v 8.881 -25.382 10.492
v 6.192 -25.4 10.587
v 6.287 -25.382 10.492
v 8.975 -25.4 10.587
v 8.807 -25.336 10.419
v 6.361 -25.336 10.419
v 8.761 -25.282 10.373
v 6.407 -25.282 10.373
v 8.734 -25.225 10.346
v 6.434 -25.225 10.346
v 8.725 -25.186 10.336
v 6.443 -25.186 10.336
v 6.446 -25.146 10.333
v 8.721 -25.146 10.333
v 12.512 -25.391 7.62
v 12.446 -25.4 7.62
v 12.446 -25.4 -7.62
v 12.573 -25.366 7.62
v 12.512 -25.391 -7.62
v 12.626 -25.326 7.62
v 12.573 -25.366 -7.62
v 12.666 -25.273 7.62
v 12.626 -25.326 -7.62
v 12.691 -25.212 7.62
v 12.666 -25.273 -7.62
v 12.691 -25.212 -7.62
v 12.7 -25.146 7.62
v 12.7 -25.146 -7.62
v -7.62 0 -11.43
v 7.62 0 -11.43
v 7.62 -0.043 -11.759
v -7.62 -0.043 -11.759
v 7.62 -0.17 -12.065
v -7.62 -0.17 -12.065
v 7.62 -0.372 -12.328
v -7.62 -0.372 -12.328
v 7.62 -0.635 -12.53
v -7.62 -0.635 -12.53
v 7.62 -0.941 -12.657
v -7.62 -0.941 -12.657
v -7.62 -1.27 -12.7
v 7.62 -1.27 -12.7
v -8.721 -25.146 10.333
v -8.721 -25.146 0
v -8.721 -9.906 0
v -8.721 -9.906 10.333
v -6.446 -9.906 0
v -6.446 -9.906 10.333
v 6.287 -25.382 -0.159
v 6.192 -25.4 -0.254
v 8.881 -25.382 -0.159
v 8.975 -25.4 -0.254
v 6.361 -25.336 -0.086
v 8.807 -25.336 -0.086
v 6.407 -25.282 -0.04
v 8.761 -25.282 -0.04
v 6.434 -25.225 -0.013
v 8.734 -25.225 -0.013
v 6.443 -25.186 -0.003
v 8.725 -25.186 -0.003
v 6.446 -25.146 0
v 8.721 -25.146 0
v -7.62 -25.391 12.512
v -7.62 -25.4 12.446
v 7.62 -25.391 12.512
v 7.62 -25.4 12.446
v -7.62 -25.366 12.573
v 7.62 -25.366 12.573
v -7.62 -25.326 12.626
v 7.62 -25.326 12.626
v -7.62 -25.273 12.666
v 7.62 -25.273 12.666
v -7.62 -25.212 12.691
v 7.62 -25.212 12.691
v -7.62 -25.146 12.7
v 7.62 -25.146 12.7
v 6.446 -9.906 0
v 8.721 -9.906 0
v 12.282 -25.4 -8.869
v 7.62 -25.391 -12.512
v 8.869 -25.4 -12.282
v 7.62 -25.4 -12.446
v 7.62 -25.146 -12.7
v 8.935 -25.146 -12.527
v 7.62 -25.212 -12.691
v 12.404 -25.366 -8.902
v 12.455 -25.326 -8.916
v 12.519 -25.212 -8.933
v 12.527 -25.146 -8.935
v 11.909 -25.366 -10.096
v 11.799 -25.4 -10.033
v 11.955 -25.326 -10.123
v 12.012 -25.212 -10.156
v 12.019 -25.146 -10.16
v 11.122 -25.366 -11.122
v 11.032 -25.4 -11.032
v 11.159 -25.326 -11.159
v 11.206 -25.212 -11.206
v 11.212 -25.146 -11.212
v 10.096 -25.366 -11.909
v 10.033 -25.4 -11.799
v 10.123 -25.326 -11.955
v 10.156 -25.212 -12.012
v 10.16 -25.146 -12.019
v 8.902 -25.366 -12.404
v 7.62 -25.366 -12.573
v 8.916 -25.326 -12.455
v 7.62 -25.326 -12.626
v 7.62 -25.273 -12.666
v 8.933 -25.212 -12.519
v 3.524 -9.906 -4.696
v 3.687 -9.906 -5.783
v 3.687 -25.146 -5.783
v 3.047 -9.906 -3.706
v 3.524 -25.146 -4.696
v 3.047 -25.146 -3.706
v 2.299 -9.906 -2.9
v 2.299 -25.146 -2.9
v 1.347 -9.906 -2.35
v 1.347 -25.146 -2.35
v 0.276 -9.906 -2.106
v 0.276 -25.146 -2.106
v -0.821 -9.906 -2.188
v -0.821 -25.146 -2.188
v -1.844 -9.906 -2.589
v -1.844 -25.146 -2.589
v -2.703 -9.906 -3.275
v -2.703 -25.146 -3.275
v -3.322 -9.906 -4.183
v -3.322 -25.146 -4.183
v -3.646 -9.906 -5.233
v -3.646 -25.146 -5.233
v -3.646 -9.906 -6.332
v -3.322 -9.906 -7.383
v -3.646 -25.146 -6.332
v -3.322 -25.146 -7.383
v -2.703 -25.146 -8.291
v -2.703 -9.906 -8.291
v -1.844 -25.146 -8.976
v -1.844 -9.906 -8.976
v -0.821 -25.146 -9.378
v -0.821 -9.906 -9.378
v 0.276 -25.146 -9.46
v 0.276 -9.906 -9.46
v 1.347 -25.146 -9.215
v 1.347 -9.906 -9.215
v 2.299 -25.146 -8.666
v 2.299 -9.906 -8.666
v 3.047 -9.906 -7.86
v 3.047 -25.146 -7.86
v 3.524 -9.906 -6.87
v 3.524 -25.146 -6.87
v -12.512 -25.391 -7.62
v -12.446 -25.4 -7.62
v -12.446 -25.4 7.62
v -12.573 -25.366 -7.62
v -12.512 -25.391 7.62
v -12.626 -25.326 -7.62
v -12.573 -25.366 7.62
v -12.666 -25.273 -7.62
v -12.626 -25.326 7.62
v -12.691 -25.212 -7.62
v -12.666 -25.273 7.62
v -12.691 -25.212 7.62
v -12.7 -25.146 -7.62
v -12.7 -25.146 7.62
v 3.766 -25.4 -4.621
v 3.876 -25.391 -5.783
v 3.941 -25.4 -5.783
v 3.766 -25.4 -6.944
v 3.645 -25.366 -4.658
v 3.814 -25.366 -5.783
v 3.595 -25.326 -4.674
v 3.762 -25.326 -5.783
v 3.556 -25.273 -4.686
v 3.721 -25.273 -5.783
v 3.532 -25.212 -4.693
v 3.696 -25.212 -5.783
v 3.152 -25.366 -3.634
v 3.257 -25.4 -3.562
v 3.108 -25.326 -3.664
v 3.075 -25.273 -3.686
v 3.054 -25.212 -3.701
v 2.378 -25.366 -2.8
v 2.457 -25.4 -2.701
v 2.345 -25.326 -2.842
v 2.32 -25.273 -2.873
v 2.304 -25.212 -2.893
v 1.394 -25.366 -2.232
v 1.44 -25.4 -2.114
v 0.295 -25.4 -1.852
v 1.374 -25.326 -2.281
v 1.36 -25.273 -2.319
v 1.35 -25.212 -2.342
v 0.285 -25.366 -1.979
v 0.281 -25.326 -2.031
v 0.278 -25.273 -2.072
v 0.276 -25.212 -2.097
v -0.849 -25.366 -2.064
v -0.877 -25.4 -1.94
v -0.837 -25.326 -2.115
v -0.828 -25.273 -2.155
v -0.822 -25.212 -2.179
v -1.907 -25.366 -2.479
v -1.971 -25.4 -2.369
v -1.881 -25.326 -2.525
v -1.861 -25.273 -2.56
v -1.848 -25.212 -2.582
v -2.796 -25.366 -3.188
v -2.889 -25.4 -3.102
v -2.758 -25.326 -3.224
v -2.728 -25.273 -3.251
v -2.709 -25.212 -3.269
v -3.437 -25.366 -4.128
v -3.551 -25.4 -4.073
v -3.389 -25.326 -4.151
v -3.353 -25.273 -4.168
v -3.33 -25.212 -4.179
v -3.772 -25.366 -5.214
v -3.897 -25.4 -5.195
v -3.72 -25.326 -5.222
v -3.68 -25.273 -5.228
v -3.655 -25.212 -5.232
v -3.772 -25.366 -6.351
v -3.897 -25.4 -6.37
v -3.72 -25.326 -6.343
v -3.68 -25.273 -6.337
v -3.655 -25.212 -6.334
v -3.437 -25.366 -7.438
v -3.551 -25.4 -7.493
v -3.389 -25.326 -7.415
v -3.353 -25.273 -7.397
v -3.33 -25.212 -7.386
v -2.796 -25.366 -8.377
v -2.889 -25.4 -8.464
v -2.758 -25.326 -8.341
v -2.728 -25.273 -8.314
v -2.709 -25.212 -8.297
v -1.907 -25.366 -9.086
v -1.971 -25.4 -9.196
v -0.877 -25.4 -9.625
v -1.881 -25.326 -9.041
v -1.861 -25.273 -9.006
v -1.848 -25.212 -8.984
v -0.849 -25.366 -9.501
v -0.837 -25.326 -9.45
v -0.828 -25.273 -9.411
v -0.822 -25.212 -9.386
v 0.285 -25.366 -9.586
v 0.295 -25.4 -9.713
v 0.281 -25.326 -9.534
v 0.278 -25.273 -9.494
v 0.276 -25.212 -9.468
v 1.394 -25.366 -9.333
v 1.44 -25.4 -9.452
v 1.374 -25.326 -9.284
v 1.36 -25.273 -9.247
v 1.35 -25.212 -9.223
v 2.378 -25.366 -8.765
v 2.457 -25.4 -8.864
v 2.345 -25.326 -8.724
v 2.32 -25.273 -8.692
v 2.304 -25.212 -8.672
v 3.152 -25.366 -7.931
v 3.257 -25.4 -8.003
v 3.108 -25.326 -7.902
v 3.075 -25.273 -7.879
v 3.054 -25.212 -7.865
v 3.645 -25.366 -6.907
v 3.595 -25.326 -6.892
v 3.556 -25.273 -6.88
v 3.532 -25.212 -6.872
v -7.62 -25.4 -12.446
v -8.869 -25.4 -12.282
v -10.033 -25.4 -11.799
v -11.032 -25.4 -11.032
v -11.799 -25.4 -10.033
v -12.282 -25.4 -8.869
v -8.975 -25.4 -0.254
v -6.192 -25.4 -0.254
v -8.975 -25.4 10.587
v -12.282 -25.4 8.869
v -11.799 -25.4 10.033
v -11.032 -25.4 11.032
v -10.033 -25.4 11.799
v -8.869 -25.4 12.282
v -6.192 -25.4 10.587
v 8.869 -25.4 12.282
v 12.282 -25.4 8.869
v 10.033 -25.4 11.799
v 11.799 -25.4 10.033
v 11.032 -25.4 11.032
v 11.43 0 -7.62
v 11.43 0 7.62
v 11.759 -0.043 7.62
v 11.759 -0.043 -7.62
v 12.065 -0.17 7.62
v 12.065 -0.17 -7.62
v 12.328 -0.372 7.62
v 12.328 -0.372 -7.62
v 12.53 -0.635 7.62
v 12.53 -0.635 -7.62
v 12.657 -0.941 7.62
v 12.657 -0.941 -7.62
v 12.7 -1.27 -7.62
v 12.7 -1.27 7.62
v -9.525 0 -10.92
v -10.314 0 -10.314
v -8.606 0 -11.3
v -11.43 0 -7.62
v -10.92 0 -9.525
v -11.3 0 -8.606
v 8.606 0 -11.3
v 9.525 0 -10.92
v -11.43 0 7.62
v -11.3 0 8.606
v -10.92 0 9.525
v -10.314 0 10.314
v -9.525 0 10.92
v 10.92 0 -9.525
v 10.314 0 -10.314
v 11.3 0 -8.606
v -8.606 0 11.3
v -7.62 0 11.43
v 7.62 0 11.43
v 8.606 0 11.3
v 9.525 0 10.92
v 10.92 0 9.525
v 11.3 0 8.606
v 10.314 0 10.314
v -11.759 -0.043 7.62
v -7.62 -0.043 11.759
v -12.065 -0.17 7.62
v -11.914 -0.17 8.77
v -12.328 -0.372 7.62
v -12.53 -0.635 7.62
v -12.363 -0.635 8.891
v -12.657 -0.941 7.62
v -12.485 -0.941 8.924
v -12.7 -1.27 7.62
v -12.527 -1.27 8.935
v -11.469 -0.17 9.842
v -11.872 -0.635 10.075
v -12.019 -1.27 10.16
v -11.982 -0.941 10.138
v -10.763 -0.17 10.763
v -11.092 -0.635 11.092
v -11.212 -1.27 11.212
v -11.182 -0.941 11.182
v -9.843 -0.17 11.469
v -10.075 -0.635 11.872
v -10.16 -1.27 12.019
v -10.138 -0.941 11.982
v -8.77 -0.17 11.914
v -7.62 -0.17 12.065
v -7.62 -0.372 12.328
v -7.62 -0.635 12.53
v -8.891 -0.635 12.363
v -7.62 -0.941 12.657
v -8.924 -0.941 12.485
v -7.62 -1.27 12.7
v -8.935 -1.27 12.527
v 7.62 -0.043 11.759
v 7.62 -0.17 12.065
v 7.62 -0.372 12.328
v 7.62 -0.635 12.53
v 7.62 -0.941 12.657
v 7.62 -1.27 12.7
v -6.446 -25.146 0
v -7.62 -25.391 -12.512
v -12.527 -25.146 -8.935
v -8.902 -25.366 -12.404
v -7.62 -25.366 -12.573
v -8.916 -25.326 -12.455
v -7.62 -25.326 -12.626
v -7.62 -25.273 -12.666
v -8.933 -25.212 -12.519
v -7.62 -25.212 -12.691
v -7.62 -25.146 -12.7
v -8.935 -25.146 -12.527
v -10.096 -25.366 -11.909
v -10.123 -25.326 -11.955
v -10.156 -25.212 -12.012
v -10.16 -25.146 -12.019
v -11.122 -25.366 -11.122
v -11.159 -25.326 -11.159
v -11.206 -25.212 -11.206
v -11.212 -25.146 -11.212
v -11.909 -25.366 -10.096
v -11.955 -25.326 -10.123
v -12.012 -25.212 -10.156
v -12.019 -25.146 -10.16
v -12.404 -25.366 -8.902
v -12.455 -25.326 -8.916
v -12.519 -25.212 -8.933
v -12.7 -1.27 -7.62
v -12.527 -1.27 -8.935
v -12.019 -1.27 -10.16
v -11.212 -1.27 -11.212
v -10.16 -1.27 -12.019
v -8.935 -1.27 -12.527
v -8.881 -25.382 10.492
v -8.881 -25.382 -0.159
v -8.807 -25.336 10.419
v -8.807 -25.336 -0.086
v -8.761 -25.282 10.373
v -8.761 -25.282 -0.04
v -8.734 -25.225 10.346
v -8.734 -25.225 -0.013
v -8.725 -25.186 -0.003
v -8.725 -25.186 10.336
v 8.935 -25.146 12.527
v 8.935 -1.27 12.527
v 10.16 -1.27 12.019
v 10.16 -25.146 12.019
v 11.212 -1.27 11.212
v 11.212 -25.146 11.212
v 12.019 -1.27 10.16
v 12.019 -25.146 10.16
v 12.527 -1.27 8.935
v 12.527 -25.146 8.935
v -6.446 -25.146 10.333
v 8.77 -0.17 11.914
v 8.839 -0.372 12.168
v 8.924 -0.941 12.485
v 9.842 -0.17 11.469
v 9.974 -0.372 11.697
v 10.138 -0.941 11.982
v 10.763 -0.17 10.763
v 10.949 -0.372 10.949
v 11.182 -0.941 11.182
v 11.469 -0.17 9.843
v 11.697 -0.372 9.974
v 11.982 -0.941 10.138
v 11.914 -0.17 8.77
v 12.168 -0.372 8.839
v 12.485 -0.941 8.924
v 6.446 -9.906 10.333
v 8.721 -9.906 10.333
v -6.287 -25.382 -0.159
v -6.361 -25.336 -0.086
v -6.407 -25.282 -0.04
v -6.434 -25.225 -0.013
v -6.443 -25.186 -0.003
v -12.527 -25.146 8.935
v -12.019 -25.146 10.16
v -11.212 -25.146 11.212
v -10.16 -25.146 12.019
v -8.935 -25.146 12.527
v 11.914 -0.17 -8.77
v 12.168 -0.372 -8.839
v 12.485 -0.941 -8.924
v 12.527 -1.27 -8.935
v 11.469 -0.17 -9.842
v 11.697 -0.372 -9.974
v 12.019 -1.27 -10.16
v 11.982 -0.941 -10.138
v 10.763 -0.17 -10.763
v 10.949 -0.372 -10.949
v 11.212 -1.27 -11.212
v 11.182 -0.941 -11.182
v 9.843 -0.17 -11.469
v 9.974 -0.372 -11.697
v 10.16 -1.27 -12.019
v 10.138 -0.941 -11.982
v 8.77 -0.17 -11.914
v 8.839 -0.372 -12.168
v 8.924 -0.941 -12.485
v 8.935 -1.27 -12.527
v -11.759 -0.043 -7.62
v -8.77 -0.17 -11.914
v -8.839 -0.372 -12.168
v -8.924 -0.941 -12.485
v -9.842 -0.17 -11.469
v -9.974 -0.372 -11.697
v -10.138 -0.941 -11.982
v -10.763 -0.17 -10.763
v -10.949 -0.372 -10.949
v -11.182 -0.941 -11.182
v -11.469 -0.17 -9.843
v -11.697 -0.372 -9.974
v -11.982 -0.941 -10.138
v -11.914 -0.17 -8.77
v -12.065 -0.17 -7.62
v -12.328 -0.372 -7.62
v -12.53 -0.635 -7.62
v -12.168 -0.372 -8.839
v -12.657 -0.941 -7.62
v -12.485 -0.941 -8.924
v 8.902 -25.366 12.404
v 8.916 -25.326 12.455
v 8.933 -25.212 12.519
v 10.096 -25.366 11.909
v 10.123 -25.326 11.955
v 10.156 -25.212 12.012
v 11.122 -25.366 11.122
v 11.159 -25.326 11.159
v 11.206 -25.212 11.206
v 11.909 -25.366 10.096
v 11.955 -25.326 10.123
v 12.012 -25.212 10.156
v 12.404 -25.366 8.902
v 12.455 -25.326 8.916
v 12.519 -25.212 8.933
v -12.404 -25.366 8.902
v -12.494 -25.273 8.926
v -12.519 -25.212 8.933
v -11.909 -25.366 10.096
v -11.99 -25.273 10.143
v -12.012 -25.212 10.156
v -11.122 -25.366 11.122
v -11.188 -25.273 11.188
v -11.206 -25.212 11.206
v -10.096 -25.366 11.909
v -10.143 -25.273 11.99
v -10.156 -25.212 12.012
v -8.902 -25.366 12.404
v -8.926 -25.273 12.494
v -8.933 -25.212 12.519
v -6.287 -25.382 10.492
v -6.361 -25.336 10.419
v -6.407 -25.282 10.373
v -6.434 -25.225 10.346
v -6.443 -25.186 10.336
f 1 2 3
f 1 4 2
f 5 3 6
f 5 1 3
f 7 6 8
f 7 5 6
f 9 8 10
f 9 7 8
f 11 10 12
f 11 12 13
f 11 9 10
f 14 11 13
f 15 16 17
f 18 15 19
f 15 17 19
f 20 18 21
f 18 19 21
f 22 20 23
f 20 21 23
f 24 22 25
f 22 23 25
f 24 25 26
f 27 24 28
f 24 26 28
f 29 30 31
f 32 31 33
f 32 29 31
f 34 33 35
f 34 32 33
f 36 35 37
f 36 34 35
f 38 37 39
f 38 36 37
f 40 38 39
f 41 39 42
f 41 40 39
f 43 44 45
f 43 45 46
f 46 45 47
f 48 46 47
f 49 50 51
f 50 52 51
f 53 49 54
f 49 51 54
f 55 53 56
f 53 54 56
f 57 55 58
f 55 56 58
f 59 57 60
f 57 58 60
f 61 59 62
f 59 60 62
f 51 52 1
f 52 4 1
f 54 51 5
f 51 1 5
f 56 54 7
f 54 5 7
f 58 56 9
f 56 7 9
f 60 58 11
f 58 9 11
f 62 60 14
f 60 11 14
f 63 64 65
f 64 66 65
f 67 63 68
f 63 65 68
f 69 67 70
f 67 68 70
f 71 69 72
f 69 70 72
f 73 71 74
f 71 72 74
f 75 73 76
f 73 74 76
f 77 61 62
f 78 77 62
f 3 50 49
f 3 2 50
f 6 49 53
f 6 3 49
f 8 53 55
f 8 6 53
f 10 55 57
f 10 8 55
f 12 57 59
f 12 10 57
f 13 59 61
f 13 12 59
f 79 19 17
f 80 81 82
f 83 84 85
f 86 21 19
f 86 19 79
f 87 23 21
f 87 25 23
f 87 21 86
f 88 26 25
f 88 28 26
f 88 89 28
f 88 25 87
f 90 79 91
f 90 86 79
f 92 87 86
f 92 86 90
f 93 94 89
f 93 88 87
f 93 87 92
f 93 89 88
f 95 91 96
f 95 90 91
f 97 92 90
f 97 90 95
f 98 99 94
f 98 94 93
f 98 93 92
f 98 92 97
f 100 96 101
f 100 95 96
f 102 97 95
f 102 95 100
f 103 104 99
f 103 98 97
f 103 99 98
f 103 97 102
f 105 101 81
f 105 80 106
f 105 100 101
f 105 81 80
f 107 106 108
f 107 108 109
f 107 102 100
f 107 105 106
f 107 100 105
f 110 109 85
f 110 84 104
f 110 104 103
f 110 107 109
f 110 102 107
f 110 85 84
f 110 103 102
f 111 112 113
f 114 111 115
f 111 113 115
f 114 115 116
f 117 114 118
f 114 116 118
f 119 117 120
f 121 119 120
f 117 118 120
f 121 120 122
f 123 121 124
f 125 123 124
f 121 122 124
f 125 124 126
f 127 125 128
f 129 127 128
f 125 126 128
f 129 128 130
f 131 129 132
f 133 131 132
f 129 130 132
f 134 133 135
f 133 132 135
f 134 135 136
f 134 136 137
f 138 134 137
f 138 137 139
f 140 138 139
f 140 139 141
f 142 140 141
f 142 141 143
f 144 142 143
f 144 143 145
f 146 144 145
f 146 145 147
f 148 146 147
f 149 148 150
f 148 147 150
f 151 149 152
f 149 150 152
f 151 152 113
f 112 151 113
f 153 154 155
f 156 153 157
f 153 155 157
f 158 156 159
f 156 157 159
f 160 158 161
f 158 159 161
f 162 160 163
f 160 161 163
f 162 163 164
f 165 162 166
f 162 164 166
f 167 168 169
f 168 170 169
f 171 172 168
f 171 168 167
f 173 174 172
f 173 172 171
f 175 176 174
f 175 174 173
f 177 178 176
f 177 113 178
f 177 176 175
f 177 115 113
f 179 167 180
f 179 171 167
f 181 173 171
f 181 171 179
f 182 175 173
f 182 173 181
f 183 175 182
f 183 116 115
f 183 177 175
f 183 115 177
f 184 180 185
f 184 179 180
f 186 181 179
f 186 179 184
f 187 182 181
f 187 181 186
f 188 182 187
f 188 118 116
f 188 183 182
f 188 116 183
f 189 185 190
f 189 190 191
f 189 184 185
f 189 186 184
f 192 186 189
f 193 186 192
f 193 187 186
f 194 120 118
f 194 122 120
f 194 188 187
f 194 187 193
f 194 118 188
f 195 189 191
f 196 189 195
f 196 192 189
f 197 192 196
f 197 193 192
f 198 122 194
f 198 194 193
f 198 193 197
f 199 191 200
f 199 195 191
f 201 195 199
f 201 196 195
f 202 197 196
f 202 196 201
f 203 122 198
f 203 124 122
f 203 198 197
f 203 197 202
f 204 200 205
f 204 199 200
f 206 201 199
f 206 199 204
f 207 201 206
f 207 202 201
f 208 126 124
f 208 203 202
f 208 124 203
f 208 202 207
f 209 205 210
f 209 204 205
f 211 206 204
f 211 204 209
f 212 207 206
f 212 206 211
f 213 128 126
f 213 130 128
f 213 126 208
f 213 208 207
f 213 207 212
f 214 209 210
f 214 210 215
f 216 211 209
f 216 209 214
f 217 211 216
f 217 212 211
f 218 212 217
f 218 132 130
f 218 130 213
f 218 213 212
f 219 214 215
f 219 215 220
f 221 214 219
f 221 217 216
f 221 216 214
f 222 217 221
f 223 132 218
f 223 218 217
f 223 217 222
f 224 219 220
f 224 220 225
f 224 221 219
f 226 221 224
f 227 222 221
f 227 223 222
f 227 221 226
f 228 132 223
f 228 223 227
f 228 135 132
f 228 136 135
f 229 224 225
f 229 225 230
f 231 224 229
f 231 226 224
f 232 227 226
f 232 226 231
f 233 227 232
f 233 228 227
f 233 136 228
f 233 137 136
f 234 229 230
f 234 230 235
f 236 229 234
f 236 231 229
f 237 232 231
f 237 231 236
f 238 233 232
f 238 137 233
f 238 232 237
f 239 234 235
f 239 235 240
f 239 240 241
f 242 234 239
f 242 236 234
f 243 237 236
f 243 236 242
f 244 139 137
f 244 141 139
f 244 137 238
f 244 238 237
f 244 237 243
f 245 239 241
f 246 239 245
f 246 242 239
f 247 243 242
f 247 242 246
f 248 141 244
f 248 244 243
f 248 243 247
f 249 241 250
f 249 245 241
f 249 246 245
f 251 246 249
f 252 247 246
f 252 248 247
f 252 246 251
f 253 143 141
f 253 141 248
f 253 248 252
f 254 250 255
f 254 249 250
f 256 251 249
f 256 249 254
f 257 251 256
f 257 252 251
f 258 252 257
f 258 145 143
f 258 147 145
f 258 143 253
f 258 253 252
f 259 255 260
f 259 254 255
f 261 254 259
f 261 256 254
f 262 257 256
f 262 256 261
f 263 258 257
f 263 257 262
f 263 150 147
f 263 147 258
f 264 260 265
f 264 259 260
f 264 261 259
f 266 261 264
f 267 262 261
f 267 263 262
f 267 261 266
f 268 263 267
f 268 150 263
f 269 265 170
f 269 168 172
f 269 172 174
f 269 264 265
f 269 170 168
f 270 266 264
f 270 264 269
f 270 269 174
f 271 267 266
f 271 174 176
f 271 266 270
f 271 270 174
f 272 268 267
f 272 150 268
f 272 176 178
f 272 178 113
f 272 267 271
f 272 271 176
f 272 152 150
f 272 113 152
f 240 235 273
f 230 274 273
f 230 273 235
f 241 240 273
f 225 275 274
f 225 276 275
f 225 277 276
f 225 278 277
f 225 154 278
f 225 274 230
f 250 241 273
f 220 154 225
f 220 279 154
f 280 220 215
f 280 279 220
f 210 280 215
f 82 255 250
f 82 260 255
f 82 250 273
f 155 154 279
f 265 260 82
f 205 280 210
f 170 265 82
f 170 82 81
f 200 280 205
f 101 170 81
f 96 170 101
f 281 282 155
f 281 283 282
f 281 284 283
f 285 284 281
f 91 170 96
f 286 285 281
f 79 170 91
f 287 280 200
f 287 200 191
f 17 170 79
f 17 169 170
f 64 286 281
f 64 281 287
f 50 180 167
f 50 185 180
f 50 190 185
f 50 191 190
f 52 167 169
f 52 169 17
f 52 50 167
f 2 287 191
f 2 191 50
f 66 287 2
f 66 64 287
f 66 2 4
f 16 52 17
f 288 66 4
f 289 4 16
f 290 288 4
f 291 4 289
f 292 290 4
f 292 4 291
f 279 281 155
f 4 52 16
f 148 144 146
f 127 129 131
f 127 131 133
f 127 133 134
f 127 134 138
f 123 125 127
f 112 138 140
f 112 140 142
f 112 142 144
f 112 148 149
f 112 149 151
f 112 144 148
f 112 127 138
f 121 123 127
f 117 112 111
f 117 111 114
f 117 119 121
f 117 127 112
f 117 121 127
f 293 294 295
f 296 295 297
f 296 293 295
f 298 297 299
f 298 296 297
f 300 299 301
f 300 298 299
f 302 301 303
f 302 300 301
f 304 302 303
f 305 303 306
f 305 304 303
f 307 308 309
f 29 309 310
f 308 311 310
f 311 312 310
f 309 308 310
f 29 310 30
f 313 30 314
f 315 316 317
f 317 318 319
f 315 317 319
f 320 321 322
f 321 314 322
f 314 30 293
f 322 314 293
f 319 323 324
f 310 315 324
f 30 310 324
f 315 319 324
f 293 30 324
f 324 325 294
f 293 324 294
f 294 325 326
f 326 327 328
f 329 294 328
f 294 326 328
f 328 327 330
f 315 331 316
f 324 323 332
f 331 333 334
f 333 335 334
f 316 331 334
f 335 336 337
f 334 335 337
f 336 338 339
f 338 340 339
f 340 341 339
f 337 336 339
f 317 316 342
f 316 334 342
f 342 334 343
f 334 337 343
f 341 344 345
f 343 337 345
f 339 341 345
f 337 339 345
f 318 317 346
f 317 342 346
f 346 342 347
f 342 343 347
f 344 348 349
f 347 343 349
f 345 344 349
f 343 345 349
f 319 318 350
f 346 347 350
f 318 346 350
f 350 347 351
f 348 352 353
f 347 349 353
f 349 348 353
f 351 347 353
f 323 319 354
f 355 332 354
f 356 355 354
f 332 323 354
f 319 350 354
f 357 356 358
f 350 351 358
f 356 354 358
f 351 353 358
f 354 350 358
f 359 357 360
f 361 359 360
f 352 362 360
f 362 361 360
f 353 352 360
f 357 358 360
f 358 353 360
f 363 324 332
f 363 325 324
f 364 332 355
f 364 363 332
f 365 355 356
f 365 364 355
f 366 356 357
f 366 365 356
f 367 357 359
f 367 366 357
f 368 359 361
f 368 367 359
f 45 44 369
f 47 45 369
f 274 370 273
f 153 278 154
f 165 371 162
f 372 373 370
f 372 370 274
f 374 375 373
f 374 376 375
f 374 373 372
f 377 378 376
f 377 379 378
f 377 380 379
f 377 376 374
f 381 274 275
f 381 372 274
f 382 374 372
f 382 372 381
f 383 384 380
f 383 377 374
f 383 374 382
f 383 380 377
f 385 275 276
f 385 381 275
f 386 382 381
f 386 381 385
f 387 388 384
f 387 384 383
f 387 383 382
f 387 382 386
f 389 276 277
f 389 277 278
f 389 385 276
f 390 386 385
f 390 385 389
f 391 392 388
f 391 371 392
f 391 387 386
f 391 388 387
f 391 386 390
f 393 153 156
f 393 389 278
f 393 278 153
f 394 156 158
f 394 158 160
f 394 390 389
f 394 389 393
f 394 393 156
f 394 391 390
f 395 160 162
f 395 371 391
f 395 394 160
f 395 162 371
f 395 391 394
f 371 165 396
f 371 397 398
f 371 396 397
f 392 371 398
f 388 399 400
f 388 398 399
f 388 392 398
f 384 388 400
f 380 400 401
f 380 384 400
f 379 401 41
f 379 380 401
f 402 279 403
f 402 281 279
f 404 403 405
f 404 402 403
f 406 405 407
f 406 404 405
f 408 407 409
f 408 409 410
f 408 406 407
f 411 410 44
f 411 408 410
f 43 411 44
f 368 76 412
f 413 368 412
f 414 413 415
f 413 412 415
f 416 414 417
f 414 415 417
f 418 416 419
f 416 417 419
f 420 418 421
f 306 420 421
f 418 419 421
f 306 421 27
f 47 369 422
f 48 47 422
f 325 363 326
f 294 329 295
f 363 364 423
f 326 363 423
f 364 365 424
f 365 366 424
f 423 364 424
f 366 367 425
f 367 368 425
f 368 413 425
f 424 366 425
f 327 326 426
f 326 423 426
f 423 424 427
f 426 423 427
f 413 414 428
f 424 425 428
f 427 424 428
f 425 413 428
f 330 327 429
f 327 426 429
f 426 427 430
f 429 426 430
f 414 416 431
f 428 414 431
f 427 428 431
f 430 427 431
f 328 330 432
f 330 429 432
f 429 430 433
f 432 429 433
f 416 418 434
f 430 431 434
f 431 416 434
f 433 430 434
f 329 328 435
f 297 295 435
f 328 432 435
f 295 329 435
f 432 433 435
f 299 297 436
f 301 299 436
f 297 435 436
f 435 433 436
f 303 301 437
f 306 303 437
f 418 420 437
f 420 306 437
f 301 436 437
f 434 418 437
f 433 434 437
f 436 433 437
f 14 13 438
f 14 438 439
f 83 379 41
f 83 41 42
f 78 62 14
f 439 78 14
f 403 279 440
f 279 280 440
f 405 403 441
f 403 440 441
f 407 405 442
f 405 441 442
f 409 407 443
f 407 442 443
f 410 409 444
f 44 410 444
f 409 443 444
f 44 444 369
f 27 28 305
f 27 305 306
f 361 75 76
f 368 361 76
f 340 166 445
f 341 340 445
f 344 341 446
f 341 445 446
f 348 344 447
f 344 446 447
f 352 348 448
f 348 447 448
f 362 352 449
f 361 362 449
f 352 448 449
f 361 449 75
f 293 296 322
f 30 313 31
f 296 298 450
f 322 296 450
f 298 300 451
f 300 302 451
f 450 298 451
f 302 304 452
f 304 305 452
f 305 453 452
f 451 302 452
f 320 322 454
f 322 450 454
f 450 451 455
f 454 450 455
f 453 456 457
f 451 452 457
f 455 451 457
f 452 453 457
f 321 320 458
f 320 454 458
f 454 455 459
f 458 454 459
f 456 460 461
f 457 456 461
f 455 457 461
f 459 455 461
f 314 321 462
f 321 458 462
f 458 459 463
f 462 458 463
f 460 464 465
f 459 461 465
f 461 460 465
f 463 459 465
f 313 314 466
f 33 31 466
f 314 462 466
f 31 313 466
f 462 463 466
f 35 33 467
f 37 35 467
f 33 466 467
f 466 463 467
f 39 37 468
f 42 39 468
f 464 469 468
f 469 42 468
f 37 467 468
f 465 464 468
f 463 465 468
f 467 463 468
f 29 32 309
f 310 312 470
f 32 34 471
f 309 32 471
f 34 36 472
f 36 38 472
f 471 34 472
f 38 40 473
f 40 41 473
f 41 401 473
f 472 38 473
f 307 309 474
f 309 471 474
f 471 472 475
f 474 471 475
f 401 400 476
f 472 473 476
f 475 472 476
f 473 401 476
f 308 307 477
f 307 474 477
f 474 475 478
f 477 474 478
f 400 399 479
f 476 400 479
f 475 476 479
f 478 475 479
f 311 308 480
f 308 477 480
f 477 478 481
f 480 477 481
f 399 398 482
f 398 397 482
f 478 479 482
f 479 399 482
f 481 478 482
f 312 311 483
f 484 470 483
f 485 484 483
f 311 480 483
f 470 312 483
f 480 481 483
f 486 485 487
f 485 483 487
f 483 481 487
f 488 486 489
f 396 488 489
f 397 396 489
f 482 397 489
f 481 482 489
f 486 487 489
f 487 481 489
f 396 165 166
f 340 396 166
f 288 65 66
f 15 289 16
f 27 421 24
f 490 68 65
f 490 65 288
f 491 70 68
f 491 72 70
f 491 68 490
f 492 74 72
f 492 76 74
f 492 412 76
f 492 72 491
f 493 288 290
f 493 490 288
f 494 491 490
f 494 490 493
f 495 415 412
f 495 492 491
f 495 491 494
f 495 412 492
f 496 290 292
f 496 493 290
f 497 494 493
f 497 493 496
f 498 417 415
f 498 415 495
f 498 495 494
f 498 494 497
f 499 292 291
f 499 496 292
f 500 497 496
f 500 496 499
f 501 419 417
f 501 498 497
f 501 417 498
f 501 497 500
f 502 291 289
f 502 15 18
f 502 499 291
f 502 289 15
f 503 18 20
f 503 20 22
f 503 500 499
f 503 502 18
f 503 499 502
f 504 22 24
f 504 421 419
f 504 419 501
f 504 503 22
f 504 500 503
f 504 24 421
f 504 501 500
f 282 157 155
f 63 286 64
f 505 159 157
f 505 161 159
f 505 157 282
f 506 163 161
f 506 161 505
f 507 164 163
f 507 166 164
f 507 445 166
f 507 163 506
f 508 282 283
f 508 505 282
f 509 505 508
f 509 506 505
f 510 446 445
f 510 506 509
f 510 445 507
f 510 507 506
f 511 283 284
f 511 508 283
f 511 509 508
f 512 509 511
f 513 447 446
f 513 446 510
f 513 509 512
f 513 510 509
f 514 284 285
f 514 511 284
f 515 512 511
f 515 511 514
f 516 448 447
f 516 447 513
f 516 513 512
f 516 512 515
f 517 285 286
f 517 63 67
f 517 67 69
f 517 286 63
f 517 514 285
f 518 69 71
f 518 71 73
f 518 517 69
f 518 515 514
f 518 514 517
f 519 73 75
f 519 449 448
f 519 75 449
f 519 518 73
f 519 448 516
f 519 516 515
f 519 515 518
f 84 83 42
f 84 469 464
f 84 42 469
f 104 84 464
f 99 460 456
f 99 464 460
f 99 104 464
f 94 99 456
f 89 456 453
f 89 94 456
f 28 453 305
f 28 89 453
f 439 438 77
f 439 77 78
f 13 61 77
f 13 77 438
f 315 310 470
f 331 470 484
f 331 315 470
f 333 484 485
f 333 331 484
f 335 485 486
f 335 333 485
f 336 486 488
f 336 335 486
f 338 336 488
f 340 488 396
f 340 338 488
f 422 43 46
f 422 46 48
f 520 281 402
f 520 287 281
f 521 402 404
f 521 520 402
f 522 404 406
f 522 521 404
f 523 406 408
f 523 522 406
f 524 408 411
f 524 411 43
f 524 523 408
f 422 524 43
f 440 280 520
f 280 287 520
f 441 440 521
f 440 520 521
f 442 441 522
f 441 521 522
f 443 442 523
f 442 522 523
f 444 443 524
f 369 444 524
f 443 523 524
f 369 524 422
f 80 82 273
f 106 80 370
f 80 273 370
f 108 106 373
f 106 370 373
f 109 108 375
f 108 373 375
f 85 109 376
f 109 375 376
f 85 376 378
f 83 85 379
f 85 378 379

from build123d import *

# Parameters (mm, degrees)
F0_W     = 25.4
F0_H     = 25.4
F1_DEPTH = 25.4
F2_W     = 2.275166
F2_H     = 10.333045
F2_R     = 3.687408
F3_DEPTH = 15.494
F4_R     = 5.08
F5_R     = 1.27
F6_R     = 0.254


with BuildPart() as f1:
    # F0 (on Front) → F1 (new body)
    with BuildSketch(Plane.XZ):
        Rectangle(F0_W, F0_H)
    extrude(amount=F1_DEPTH)

    # F2 (on face) → F3 (cut)
    with BuildSketch(Plane.XZ.offset(25.4)):
        with Locations((-7.583885, 5.166523)):
            Rectangle(F2_W, F2_H)
        with Locations((7.583885, 5.166523)):
            Rectangle(F2_W, F2_H)
        with Locations((0, -5.782713)):
            Circle(F2_R)
    extrude(amount=-F3_DEPTH, mode=Mode.SUBTRACT)

    # F4
    f4_edges = [f1.edges().sort_by_distance(p)[0] for p in [
        (-12.7, -12.7, 12.7),
        (12.7, -12.7, 12.7),
        (-12.7, -12.7, -12.7),
        (12.7, -12.7, -12.7),
    ]]
    fillet(f4_edges, radius=F4_R)

    # F5
    f5_edges = [f1.edges().sort_by_distance(p)[0] for p in [
        (0, 0, 12.7),
        (11.212102, 0, 11.212102),
        (-11.212102, 0, 11.212102),
        (12.7, 0, 0),
        (-12.7, 0, 0),
        (11.212102, 0, -11.212102),
        (-11.212102, 0, -11.212102),
        (0, 0, -12.7),
    ]]
    fillet(f5_edges, radius=F5_R)

    # F6
    f6_edges = [f1.edges().sort_by_distance(p)[0] for p in [
        (0, -25.4, 12.7),
        (11.212102, -25.4, 11.212102),
        (-11.212102, -25.4, 11.212102),
        (12.7, -25.4, 0),
        (-12.7, -25.4, 0),
        (11.212102, -25.4, -11.212102),
        (-11.212102, -25.4, -11.212102),
        (0, -25.4, -12.7),
        (-3.687408, -25.4, -5.782713),
        (-8.721468, -25.4, 5.166523),
        (-7.583885, -25.4, 0),
        (-6.446302, -25.4, 5.166523),
        (-7.583885, -25.4, 10.333045),
        (7.583885, -25.4, 10.333045),
        (6.446302, -25.4, 5.166523),
        (7.583885, -25.4, 0),
        (8.721468, -25.4, 5.166523),
    ]]
    fillet(f6_edges, radius=F6_R)


solid = f1.part
